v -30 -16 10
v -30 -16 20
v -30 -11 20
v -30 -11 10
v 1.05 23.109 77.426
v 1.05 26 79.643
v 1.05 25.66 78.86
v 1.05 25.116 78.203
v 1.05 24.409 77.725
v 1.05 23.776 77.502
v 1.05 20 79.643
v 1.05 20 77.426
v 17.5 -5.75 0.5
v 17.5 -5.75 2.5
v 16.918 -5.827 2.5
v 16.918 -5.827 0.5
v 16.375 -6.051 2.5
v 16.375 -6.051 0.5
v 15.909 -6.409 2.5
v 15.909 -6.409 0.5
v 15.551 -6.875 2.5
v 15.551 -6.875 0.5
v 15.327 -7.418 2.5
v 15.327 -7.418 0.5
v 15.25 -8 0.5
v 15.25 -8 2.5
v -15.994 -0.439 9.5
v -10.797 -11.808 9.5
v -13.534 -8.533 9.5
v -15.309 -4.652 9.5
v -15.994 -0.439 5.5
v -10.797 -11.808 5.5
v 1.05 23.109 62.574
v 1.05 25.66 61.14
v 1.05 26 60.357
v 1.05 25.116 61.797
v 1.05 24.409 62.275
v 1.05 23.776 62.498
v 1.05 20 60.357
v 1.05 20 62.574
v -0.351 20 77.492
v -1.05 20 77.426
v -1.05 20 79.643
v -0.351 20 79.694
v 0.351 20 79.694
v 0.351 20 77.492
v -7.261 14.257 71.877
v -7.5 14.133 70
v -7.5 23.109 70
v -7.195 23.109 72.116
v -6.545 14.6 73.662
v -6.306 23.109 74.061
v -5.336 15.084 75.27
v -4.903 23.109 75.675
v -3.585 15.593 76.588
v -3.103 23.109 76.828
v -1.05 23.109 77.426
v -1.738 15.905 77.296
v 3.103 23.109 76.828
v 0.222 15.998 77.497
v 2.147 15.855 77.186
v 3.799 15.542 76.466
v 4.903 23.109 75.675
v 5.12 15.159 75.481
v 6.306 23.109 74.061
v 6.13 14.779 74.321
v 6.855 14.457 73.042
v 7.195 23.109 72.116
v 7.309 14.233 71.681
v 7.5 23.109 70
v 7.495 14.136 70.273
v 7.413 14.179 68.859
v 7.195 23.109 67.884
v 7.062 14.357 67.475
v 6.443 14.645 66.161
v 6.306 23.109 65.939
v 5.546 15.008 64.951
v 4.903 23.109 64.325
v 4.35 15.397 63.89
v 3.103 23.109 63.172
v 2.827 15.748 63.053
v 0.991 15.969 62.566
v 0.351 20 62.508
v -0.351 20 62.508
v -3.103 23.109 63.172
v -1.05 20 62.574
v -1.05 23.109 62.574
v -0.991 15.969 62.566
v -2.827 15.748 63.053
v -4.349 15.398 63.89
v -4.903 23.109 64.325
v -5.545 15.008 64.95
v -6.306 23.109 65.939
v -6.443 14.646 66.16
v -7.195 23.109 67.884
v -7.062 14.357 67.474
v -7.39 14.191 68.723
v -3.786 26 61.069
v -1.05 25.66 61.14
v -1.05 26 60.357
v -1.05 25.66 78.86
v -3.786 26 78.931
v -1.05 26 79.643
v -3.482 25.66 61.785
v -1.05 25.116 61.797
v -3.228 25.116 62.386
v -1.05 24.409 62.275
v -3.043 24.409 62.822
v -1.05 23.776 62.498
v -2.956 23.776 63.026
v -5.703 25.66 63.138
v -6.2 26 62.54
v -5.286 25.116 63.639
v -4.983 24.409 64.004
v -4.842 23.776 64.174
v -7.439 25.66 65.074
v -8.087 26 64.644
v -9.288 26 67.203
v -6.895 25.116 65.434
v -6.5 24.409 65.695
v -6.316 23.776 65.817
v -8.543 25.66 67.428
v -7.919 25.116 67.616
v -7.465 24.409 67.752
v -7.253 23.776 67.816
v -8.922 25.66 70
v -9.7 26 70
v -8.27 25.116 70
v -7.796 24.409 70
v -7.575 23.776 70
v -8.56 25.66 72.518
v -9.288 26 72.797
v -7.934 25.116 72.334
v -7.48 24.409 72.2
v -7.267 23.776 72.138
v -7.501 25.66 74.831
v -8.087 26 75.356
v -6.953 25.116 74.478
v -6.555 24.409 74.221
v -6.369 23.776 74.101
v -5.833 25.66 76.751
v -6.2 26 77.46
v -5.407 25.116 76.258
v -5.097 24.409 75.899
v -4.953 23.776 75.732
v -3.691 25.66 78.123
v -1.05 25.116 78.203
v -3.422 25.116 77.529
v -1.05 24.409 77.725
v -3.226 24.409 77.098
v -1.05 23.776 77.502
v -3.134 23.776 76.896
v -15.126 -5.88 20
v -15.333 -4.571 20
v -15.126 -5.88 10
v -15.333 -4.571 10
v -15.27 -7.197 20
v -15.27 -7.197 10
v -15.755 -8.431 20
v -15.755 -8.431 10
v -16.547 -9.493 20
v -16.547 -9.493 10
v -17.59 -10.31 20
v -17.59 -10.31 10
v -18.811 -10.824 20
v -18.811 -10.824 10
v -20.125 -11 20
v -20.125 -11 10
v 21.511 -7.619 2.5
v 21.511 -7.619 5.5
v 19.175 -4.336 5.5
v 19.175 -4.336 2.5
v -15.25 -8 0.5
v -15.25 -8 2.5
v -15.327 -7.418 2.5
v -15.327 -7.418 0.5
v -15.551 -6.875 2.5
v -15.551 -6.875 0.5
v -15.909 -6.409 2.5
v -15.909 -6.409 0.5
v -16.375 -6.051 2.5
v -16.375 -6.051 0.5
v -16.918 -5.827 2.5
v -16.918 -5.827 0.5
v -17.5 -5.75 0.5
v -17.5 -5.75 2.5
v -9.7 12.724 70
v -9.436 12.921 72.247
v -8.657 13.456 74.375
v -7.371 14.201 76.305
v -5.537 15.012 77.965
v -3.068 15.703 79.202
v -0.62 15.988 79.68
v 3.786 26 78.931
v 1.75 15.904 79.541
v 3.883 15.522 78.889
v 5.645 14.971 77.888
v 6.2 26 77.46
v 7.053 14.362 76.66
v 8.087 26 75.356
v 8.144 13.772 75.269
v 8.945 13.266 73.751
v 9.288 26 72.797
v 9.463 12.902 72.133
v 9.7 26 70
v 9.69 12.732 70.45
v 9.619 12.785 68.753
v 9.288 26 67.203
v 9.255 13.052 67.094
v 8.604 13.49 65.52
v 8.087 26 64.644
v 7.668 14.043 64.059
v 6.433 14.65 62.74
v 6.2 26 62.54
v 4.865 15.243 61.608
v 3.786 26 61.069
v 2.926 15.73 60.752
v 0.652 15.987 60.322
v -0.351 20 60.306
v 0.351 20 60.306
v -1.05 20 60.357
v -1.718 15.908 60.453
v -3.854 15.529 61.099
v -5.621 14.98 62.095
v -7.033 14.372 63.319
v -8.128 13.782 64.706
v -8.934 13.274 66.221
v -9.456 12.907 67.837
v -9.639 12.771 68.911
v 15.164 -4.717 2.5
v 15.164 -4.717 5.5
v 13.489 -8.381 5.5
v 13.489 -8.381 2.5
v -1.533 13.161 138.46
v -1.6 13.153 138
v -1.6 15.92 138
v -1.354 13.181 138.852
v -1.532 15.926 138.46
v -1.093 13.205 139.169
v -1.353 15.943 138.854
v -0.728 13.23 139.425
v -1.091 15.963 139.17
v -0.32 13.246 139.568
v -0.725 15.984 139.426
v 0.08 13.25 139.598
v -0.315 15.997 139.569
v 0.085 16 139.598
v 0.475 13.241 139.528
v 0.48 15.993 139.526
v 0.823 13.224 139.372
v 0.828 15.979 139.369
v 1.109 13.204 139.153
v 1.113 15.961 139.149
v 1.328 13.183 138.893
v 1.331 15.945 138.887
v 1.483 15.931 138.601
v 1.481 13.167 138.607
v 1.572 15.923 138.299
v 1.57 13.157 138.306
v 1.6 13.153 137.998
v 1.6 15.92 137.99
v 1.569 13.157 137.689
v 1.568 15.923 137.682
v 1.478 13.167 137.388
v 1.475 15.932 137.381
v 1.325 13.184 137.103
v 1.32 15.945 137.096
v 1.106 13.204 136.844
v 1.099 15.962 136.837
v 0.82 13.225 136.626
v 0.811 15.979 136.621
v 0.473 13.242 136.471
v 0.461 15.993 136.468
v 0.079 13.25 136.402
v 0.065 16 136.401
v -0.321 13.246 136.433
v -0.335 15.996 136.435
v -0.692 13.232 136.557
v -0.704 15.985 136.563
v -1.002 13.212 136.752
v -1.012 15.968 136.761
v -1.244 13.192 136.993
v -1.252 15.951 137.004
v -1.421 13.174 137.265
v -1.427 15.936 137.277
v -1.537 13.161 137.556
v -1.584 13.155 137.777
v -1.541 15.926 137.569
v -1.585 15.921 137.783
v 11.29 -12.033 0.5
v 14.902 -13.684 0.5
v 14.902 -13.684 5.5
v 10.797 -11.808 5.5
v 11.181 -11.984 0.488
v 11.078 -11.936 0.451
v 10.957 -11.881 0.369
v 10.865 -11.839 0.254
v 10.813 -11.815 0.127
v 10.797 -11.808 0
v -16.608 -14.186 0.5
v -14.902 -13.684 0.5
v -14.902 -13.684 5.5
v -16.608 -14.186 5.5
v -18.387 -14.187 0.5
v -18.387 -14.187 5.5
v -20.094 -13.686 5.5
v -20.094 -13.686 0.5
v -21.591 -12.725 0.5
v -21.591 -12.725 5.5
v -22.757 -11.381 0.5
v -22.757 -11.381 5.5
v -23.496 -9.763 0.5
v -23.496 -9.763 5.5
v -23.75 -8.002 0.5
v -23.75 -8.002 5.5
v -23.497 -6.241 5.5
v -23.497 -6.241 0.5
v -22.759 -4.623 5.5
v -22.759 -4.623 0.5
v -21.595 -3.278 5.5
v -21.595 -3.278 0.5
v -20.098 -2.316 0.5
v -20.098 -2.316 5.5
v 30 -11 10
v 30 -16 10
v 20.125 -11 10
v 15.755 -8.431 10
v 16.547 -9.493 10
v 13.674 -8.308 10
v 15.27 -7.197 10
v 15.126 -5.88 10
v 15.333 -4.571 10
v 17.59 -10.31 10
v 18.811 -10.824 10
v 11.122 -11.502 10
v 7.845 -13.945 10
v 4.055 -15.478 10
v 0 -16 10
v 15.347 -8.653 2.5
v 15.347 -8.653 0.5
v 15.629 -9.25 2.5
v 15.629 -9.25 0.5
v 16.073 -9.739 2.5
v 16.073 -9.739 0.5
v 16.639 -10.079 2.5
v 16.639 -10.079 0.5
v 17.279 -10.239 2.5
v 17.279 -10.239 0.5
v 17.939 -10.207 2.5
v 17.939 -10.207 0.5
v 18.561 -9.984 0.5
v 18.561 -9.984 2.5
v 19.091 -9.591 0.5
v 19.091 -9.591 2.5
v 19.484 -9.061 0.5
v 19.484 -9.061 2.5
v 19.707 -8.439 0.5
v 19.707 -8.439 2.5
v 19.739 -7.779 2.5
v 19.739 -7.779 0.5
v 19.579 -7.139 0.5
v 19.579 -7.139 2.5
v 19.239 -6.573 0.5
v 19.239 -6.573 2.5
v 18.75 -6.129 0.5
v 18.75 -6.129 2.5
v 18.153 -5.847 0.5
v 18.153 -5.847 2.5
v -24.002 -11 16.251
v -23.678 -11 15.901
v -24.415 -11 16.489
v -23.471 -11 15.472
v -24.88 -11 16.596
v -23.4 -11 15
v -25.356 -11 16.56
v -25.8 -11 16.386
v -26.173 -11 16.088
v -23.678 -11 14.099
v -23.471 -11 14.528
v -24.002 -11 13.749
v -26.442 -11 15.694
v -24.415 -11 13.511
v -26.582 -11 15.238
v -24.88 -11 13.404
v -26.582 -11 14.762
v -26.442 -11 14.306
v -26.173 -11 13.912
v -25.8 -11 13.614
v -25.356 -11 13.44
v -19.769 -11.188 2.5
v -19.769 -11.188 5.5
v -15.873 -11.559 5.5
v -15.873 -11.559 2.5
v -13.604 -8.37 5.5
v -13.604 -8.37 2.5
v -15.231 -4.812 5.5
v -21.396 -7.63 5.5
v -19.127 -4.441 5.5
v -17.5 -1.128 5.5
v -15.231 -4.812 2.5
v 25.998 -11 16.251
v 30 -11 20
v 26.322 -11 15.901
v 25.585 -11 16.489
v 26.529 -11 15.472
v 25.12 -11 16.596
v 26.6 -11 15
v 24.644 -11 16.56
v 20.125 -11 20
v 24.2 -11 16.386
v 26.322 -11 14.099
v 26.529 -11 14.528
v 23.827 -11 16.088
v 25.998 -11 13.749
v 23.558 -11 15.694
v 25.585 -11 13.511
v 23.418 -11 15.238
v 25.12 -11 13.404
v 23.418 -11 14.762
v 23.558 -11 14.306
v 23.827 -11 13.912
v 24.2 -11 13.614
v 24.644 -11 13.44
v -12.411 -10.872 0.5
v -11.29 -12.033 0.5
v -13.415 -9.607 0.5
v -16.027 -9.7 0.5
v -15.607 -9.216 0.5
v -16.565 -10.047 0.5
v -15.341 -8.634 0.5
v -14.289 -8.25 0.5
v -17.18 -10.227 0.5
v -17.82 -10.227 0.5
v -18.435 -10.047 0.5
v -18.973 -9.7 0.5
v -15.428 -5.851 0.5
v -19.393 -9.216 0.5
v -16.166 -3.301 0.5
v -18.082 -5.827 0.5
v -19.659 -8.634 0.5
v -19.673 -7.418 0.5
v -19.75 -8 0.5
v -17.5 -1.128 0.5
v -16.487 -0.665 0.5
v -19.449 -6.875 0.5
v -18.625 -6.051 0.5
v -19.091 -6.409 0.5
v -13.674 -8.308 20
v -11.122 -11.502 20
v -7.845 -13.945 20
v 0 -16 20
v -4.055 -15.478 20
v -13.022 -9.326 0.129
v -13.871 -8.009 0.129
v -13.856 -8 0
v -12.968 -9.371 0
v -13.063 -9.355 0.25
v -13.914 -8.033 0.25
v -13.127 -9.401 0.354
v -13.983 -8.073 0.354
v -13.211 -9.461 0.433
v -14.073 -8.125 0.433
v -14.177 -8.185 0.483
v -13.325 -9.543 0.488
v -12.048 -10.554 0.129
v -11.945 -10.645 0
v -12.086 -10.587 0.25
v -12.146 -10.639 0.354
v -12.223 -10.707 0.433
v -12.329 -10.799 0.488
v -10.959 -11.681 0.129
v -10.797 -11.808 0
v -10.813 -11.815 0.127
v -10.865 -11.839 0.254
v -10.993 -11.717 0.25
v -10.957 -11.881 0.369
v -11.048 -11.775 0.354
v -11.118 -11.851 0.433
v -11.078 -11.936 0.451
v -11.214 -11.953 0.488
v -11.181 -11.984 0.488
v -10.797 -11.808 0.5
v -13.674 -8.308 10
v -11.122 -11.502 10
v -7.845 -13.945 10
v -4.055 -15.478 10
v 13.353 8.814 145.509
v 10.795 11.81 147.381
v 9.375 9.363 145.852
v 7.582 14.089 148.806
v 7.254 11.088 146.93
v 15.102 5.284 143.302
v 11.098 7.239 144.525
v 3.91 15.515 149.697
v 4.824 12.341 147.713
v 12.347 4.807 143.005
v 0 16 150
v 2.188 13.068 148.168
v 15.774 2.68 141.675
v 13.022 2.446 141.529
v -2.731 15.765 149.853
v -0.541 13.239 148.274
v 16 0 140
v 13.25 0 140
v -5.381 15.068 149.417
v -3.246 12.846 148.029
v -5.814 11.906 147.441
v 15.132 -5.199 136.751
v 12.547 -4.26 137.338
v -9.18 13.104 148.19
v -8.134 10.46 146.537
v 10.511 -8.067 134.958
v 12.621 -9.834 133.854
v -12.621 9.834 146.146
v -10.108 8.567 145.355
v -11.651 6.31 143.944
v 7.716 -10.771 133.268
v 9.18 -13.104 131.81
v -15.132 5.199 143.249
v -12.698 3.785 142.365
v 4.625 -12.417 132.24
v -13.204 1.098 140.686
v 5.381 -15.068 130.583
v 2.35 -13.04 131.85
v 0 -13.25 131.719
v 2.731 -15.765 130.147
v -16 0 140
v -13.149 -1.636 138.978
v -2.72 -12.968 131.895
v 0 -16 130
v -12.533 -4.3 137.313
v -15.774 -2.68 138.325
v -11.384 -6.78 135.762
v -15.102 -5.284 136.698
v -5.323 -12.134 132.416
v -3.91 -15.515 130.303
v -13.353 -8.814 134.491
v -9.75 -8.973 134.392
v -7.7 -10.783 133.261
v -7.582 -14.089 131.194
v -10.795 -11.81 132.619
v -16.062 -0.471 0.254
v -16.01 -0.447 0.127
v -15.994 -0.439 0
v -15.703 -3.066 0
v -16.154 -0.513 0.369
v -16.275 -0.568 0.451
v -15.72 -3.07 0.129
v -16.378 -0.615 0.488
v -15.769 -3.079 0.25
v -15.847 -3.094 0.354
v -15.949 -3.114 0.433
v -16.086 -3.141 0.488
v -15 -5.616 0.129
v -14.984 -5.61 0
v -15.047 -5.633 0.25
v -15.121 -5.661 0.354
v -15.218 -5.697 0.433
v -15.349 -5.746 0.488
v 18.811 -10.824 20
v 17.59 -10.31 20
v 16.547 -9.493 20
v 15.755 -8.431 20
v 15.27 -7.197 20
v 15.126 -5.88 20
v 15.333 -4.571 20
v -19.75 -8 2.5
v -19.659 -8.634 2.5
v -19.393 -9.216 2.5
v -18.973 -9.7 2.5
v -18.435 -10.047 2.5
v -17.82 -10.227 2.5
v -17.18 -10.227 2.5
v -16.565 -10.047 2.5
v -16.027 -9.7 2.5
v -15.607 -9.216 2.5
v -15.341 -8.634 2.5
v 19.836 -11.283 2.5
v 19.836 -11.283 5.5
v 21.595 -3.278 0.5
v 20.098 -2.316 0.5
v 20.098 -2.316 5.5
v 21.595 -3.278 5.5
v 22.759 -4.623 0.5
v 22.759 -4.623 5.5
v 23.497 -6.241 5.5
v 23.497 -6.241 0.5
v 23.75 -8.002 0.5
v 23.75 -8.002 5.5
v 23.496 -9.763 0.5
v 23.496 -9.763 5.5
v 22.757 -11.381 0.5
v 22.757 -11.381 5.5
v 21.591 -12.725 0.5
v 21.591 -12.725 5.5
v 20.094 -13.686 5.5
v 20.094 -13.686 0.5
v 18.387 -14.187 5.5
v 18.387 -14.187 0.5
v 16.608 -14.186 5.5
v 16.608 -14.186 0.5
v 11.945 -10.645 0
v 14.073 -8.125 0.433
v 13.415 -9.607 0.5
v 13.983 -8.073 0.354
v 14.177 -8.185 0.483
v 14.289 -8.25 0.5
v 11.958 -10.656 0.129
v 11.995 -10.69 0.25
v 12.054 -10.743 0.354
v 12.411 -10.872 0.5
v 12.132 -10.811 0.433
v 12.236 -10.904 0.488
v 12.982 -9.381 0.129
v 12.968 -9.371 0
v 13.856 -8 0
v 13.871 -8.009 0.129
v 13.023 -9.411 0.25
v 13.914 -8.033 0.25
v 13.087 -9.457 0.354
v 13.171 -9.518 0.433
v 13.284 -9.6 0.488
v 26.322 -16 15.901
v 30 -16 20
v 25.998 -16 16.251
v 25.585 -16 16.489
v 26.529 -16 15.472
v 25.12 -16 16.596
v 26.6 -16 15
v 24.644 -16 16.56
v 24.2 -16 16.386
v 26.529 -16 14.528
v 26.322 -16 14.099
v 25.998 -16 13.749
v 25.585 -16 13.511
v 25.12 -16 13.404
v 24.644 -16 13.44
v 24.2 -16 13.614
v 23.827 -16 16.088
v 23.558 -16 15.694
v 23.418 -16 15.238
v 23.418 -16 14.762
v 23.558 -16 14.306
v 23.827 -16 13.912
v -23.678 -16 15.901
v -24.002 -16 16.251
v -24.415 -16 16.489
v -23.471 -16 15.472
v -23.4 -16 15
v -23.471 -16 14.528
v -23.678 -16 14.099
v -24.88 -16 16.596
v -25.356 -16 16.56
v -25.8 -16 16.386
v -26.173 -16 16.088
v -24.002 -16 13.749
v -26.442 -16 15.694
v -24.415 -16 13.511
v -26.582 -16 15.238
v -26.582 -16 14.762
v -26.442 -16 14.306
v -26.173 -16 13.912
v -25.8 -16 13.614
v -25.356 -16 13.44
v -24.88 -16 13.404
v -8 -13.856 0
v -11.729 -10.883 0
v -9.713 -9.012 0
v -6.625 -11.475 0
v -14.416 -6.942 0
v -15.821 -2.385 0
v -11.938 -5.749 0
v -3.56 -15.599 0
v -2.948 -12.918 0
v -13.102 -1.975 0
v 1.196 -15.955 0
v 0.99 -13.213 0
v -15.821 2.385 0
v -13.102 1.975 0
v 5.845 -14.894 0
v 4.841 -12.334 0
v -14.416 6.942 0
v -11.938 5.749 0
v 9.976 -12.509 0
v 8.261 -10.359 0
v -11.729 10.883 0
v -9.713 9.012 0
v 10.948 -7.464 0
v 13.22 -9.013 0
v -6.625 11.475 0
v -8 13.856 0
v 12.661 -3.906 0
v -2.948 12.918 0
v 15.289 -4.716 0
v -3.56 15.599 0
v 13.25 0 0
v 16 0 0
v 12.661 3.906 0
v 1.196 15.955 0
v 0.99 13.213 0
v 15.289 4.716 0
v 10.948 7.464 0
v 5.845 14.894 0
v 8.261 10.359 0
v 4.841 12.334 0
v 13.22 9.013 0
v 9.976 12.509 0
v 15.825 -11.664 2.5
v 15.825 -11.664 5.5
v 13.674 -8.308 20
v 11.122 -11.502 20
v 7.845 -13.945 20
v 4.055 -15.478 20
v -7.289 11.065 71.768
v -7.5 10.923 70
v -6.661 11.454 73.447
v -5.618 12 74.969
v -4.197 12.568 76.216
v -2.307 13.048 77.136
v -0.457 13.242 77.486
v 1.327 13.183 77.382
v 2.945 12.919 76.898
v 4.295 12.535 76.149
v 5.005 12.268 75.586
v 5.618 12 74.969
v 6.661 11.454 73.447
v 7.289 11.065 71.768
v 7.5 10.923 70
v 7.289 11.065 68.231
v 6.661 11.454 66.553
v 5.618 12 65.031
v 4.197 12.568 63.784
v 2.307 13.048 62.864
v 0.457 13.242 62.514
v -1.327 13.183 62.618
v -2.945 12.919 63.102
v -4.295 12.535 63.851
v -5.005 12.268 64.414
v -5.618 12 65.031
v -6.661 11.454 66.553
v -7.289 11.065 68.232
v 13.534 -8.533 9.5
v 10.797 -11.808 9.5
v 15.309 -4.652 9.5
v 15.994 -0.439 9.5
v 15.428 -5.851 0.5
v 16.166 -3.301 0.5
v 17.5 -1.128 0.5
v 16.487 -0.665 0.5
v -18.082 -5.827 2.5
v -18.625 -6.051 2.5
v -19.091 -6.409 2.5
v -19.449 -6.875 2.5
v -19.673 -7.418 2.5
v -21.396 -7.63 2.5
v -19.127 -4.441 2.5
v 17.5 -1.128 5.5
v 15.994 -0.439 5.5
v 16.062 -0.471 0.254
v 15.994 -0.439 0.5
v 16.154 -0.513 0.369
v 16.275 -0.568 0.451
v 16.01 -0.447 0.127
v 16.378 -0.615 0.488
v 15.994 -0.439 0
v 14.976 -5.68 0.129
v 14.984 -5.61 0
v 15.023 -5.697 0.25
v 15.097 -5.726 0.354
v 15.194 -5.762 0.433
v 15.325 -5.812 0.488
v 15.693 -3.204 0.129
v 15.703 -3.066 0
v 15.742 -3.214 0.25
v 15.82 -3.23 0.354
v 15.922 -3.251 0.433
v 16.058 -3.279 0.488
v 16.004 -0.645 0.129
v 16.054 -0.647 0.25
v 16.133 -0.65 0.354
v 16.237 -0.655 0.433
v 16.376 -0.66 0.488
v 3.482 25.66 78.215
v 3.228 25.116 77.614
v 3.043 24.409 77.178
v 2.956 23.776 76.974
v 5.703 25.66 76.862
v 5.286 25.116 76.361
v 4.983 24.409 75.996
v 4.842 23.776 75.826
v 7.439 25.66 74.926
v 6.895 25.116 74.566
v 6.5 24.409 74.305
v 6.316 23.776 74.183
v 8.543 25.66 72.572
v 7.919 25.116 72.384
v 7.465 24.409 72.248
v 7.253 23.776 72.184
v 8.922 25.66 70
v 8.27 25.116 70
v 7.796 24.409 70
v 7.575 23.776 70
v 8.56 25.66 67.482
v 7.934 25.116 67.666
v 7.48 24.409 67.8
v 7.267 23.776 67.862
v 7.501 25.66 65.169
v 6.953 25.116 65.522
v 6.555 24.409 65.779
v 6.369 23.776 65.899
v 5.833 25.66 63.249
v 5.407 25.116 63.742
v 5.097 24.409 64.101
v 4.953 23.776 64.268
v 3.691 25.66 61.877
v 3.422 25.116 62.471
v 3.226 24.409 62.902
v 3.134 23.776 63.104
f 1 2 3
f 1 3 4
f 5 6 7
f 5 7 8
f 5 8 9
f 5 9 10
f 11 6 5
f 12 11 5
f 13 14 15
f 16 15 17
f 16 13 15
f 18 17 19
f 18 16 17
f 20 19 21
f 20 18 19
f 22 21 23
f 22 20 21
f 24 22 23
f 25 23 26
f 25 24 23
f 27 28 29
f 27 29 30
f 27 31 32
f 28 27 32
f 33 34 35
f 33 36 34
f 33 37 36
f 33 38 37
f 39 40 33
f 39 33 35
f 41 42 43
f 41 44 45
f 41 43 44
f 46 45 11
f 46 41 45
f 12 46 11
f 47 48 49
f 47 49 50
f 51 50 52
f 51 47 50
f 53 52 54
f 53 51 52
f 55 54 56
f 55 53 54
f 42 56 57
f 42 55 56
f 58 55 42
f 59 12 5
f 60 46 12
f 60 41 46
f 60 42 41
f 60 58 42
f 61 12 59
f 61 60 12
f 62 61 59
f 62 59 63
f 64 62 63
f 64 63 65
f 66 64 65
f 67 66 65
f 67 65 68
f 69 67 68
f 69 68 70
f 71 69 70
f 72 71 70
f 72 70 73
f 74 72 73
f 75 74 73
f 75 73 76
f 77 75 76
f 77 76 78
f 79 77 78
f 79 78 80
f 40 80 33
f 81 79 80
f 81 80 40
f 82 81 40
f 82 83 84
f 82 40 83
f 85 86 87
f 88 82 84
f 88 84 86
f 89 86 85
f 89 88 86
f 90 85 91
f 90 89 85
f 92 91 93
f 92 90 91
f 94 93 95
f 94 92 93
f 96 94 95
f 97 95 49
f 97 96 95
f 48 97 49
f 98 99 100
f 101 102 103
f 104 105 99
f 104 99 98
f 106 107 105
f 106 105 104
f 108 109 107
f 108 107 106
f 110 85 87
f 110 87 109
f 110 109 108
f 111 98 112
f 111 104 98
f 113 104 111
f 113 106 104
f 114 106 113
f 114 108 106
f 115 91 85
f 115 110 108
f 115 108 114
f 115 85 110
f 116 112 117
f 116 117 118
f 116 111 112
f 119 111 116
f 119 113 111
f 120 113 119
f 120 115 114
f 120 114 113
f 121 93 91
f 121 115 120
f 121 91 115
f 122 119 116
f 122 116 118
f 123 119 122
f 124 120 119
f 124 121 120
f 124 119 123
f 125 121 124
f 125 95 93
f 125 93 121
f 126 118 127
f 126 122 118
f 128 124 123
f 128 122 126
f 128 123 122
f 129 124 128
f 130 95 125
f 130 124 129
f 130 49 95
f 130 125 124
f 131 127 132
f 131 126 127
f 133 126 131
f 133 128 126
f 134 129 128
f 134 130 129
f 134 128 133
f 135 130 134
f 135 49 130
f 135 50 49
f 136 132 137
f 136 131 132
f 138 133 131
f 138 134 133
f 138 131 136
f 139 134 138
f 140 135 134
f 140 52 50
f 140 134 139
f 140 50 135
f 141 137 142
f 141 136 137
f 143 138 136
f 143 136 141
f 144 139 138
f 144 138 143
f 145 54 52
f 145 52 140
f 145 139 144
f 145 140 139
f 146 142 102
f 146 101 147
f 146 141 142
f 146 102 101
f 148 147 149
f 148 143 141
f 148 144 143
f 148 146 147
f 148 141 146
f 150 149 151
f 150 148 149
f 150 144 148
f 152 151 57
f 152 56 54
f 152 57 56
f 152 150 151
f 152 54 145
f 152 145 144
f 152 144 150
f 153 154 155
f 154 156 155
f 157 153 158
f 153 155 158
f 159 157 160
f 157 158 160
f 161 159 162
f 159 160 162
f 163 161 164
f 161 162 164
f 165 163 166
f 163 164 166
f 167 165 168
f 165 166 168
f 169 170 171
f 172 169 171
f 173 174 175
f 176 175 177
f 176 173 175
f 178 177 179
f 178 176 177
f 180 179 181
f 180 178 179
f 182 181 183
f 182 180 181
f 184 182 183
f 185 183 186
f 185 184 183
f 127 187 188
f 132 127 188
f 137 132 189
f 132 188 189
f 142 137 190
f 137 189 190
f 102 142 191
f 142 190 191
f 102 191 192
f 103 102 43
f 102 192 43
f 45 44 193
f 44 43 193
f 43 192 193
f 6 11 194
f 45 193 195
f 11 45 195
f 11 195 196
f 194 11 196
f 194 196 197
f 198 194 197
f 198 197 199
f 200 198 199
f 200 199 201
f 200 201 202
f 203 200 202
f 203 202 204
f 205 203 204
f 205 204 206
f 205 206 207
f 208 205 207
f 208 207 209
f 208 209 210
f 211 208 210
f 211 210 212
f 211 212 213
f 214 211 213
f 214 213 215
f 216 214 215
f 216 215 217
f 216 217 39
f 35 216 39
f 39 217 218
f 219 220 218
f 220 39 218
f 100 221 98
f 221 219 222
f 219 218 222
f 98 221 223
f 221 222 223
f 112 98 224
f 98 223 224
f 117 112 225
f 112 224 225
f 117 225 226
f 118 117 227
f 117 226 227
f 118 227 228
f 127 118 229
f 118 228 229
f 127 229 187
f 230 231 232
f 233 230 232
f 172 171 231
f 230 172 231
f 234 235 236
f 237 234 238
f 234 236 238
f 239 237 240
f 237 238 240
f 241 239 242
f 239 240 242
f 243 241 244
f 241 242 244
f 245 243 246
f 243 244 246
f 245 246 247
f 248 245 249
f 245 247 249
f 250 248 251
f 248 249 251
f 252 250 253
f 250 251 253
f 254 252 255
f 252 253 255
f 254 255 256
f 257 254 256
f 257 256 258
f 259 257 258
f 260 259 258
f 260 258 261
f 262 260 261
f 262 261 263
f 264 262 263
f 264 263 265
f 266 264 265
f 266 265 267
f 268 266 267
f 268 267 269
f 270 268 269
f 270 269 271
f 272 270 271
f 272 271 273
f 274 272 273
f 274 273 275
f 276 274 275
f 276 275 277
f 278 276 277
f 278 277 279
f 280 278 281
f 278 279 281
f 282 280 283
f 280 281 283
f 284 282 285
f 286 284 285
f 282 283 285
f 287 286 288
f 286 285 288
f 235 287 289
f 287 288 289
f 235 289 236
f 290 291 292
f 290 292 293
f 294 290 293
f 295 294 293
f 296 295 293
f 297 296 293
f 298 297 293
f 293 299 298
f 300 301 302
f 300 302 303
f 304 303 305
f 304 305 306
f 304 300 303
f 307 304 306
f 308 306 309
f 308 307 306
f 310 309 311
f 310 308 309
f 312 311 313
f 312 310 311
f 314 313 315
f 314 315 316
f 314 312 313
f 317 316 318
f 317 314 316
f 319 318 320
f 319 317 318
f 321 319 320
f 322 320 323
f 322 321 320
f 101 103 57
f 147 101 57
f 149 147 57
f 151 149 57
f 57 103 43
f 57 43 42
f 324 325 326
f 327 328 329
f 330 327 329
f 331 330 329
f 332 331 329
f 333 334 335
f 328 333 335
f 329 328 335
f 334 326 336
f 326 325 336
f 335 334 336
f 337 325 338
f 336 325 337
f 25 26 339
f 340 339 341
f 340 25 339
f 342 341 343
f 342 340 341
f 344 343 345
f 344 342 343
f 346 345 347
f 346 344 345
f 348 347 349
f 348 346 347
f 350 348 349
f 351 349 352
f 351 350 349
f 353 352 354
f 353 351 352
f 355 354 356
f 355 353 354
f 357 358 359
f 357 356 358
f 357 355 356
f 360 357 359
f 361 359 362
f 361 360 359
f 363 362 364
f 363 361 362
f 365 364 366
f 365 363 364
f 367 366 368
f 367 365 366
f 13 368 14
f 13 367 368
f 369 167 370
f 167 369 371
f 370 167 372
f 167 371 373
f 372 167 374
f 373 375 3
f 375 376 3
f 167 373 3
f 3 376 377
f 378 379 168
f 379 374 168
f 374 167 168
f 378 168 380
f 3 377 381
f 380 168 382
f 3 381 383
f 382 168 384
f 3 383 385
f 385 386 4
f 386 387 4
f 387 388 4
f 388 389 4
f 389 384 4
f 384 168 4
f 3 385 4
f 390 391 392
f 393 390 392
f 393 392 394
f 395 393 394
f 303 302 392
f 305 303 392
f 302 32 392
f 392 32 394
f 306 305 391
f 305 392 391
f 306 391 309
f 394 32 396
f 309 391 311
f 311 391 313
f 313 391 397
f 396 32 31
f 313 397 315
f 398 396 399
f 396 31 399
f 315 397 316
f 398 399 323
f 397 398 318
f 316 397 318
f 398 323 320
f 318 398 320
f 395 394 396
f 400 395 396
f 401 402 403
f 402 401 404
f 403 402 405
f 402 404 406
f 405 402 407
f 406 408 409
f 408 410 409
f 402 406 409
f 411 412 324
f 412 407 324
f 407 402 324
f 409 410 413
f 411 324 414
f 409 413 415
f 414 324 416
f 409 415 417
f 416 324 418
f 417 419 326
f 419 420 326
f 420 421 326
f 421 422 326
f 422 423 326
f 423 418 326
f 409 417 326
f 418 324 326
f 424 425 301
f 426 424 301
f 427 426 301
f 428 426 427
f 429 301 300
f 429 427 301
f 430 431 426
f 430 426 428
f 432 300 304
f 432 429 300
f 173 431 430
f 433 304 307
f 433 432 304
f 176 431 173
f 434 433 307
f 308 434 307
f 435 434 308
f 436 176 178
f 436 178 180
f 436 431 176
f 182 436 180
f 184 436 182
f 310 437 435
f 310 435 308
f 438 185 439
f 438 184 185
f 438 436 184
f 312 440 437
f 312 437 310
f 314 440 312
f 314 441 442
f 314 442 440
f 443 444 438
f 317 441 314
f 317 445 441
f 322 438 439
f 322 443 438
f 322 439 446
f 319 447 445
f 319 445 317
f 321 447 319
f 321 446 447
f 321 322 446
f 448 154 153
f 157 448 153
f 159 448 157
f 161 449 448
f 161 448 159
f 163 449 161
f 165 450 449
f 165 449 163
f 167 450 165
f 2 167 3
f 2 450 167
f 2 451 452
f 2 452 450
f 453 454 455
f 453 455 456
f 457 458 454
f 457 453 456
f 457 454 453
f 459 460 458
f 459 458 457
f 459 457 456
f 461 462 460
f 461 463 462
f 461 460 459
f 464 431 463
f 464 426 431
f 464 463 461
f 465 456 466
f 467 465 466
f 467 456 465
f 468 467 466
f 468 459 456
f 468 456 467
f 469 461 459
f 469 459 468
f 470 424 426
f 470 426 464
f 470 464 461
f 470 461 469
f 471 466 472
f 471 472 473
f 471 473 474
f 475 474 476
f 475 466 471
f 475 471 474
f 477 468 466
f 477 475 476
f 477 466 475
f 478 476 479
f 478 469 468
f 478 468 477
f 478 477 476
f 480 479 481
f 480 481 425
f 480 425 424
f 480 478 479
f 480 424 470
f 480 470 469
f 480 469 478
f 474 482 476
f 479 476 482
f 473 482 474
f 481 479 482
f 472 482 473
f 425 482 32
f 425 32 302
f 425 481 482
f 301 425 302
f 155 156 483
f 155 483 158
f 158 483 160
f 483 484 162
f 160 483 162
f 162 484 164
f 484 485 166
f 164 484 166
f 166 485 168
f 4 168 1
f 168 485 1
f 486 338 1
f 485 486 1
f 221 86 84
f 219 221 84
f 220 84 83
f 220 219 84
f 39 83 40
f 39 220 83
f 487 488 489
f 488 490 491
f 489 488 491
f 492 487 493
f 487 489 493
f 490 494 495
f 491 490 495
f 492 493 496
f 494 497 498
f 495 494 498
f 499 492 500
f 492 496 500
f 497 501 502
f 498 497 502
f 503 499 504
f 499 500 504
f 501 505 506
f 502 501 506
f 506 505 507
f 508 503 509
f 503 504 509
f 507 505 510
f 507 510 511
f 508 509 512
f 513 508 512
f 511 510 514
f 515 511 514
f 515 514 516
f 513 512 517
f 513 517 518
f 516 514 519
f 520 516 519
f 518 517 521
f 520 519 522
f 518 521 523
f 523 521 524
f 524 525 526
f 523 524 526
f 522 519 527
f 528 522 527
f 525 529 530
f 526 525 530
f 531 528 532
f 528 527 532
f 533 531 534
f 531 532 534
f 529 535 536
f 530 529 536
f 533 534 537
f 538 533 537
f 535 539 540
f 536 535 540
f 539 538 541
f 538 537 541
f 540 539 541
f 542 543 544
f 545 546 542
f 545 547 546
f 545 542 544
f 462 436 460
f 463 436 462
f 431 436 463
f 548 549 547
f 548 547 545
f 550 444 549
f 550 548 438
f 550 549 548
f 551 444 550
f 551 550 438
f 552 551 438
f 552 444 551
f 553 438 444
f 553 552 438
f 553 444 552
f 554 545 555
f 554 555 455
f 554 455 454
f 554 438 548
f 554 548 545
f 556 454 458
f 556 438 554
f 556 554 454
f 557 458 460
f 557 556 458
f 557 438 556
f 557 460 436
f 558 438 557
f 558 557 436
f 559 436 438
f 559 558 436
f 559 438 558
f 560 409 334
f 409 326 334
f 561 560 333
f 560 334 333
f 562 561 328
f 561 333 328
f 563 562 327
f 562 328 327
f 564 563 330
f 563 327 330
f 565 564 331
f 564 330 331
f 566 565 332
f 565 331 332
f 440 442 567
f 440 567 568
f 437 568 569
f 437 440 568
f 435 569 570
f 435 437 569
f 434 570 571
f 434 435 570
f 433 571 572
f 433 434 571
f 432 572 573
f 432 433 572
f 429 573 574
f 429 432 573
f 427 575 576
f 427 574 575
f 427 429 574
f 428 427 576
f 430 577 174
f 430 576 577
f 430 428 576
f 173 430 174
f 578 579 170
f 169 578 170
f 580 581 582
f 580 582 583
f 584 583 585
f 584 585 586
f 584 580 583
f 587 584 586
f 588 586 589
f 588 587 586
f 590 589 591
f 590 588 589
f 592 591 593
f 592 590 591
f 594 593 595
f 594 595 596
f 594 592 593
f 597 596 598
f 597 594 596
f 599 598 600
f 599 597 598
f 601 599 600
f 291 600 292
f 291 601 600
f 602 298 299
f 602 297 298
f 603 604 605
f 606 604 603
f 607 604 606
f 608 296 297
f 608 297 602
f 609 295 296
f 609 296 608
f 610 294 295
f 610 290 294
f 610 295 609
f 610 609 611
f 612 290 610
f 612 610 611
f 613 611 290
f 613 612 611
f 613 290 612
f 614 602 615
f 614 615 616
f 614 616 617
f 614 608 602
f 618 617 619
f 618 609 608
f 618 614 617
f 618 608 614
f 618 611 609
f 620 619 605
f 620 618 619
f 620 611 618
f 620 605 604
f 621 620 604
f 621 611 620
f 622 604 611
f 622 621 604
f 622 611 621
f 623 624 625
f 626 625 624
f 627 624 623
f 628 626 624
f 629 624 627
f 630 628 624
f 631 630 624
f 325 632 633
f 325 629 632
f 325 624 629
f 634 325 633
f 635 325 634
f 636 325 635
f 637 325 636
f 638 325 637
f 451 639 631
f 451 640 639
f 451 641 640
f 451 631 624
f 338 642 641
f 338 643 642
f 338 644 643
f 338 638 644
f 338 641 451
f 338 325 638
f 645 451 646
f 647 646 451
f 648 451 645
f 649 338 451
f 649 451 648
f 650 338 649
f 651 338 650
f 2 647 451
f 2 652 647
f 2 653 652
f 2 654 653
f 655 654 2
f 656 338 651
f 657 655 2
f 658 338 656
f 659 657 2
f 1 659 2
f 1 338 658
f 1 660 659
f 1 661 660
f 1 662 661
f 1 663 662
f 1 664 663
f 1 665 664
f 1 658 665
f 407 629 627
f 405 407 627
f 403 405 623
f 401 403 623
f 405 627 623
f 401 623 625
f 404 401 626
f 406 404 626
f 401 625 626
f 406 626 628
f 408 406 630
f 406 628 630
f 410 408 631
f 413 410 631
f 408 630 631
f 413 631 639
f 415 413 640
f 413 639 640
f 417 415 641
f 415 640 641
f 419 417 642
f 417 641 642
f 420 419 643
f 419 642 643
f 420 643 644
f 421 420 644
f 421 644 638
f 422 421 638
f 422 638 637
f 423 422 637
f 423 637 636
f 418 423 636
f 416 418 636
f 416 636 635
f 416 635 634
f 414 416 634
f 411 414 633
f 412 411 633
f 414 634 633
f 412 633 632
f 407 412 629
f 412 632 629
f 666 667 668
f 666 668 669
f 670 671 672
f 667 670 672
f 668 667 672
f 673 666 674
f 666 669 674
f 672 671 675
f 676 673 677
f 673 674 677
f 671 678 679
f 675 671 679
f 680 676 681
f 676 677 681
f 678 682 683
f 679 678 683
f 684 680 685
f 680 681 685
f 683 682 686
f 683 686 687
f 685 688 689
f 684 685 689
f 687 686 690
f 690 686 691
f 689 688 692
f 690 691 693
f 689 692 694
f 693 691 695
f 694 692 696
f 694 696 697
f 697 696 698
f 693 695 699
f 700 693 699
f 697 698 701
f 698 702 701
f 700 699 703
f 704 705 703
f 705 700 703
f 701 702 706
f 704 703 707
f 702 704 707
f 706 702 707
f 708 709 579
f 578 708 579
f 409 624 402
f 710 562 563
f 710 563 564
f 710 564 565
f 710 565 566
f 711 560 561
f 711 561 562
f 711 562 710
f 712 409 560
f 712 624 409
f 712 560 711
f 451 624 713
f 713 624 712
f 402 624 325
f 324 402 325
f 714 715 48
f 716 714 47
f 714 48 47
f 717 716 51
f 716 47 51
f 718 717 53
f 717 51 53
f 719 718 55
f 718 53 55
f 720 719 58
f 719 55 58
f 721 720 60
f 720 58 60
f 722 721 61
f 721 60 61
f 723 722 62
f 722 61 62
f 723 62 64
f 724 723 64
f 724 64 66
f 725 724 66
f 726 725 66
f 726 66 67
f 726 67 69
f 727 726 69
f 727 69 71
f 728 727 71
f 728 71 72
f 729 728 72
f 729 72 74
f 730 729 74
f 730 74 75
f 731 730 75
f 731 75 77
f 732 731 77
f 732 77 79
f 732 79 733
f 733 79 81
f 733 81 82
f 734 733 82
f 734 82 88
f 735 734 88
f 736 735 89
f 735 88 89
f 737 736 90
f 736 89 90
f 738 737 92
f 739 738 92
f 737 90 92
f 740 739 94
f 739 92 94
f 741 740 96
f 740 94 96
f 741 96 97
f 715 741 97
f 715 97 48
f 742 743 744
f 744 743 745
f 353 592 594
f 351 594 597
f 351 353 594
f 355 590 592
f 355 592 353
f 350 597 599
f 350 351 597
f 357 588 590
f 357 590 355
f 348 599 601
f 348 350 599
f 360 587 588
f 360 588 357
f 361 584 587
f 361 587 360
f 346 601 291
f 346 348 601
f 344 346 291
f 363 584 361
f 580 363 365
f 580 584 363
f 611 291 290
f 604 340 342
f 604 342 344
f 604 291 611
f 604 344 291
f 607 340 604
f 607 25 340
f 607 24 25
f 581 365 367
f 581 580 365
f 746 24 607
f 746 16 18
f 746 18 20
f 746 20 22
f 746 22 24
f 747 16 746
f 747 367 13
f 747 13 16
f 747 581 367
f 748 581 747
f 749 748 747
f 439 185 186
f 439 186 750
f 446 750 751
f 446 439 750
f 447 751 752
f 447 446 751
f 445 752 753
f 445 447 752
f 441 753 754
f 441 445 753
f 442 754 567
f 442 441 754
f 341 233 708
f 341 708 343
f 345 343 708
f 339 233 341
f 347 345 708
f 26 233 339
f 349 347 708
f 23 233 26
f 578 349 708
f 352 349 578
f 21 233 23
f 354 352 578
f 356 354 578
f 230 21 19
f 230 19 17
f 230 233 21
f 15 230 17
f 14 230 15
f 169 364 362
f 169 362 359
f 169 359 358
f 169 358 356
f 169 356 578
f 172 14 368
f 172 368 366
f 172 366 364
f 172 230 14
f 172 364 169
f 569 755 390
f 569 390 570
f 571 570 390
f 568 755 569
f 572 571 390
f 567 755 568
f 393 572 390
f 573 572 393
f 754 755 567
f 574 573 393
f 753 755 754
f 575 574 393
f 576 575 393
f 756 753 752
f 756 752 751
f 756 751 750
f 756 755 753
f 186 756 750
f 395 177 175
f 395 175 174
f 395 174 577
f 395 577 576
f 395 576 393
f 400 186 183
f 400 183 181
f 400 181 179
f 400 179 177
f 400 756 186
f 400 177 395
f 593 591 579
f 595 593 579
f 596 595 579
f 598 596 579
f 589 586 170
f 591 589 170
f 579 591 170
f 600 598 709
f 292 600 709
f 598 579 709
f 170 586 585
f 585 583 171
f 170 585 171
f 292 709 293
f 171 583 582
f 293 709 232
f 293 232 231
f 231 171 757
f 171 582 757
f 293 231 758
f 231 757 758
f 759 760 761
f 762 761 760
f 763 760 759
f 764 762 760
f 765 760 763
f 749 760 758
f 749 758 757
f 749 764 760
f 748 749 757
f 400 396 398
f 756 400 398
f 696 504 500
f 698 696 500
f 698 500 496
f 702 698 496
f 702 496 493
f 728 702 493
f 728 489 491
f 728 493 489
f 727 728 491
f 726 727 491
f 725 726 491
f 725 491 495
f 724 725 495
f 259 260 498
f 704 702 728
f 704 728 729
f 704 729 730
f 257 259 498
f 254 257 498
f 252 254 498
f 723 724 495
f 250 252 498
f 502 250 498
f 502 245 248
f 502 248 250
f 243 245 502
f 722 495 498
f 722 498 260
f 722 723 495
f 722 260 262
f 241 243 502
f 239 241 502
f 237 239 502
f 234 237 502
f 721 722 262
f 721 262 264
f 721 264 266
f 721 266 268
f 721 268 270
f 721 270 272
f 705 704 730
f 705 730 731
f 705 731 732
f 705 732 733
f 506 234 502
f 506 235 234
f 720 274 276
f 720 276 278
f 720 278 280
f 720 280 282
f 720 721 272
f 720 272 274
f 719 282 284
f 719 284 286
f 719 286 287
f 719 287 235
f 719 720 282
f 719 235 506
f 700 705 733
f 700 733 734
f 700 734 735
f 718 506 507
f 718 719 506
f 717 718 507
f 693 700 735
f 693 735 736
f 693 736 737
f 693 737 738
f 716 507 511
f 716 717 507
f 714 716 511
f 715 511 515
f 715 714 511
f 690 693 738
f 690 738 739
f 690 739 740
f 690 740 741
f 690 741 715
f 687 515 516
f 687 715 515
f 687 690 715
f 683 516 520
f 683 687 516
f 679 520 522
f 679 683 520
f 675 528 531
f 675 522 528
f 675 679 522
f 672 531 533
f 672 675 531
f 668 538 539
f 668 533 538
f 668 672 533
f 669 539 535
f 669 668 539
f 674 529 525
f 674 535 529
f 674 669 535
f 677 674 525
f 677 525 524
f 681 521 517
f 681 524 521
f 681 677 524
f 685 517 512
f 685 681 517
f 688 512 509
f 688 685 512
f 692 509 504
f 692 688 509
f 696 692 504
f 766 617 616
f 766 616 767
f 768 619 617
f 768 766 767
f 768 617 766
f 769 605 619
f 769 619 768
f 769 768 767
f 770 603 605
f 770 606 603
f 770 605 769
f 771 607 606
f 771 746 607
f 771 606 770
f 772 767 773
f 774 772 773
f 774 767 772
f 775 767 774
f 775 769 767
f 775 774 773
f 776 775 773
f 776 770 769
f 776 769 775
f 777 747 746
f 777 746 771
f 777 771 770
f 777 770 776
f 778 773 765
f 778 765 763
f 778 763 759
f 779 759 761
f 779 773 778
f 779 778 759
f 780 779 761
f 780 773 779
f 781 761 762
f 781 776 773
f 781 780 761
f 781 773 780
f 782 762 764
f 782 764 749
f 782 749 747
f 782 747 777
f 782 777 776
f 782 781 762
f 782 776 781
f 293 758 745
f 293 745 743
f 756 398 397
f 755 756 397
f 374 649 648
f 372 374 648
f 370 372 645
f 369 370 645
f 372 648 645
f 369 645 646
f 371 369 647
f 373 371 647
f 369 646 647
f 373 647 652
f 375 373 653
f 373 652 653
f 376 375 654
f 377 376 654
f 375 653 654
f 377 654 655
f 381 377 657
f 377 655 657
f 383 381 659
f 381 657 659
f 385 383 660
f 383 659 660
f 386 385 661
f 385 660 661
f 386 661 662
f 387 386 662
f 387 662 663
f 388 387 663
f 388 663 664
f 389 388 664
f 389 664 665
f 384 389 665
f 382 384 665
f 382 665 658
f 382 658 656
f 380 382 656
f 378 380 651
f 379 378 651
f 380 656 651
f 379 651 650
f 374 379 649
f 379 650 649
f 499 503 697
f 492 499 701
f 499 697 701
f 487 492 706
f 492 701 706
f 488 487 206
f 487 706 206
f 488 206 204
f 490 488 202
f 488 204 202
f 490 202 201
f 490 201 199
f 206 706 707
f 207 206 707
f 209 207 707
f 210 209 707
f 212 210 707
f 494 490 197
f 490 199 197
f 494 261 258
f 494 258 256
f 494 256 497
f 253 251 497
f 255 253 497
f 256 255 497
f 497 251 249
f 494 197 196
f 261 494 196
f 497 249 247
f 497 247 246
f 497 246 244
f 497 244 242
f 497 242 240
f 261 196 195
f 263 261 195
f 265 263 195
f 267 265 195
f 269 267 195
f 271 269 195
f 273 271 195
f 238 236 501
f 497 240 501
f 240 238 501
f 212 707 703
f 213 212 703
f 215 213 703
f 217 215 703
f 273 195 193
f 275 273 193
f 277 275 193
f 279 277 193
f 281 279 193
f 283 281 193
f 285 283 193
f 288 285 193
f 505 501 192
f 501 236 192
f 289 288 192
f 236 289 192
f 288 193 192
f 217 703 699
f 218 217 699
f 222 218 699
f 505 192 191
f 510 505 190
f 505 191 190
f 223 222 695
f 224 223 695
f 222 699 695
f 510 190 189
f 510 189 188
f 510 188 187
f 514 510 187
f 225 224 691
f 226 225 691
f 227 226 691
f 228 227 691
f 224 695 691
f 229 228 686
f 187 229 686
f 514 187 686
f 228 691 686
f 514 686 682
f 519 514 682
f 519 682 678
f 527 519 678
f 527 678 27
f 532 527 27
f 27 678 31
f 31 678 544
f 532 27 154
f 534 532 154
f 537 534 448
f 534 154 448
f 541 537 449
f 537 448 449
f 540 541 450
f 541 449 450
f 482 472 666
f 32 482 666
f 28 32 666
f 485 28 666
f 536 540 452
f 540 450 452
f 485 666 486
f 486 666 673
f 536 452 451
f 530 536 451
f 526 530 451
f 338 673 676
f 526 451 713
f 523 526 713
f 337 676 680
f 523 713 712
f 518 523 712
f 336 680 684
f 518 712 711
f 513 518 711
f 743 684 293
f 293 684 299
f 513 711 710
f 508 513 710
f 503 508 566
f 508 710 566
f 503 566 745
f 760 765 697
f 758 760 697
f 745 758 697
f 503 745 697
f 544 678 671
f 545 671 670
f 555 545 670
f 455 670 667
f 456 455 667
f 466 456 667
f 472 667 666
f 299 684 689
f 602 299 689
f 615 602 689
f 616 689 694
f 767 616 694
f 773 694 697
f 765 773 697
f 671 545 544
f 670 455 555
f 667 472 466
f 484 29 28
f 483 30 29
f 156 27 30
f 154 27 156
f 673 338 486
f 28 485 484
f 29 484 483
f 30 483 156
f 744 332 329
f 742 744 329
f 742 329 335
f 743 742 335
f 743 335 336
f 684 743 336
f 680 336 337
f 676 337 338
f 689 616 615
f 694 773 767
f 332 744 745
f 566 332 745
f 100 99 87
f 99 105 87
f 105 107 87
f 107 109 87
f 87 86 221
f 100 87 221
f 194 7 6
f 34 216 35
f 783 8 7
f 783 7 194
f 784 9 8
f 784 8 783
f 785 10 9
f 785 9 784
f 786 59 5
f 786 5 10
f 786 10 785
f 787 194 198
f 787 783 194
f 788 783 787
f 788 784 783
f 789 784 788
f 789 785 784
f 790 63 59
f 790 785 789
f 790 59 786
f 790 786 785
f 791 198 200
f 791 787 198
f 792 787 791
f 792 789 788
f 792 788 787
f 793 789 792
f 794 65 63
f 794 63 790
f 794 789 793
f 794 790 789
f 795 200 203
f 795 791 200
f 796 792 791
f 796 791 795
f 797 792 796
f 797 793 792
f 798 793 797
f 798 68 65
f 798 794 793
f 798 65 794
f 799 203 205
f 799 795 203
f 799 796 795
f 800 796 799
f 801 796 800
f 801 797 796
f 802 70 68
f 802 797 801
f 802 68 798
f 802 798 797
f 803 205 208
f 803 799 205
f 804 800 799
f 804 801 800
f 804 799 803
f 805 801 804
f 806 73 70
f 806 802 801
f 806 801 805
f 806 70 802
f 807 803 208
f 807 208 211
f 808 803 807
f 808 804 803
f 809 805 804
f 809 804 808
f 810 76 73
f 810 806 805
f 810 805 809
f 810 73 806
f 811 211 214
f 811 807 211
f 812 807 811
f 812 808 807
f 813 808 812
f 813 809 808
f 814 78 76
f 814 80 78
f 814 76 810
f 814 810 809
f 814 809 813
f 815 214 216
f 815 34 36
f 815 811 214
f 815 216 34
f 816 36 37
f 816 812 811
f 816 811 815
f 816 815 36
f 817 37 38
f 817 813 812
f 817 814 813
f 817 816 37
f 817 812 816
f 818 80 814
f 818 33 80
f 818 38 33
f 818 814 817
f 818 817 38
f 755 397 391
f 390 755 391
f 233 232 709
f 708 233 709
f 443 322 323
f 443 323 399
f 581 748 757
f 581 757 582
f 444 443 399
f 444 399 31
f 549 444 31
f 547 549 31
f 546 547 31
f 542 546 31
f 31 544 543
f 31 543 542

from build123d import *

# Parameters (mm, degrees)
SKETCH4_R                = 16
SKETCH4_R_2              = 13.25
BOSS_EXTRUDE3_DEPTH      = 150
BOSS_EXTRUDE4_DEPTH      = 10
BOSS_EXTRUDE4_DEPTH_BACK = 4
SKETCH6_R                = 9.7
SKETCH6_R_2              = 7.5
SKETCH7_R                = 7.5
CUT_EXTRUDE1_DEPTH       = 20
CUT_EXTRUDE2_START       = -150
SKETCH8_R                = 13.25
CUT_EXTRUDE2_DEPTH       = 150
SKETCH11_R               = 1.6
CUT_EXTRUDE5_DEPTH       = 13
CUT_EXTRUDE7_DEPTH       = 42.3
SKETCH15_W               = 60
SKETCH15_H               = 10
SKETCH15_R               = 1.6
BOSS_EXTRUDE5_DEPTH      = 5
SKETCH16_R               = 13.25
CUT_EXTRUDE8_DEPTH       = 150
FILLET2_R                = 3
FILLET3_R                = 5
CUT_EXTRUDE10_START      = 4
SKETCH20_R               = 4.747407389
SKETCH20_W               = 2.1
SKETCH20_H               = 3
CUT_EXTRUDE10_DEPTH      = 6
BOSS_EXTRUDE6_START      = -0.5
BOSS_EXTRUDE6_DEPTH      = 5
FILLET4_R                = 0.5
CUT_EXTRUDE11_DEPTH      = 4
CUT_EXTRUDE12_DEPTH      = 3


# Some blends are built 0.0001 mm under size
with BuildPart() as part:
    # Sketch4 → Boss-Extrude3 (new body)
    with BuildSketch(Plane.XY):
        Circle(SKETCH4_R)
        Circle(SKETCH4_R_2, mode=Mode.SUBTRACT)
    extrude(amount=BOSS_EXTRUDE3_DEPTH)

    # Sketch6 → Boss-Extrude4 (add, two sides: drawn at the far end of the back side and taken through both)
    with BuildSketch(Plane(origin=(0, 16, 150), x_dir=(1, 0, 0), z_dir=(0, 1, 0)).offset(-BOSS_EXTRUDE4_DEPTH_BACK)):
        with Locations(Location((0, 80, 0), (0, 0, 180))):
            Circle(SKETCH6_R)
        with Locations(Location((0, 80, 0), (0, 0, 180))):
            Circle(SKETCH6_R_2, mode=Mode.SUBTRACT)
    extrude(amount=BOSS_EXTRUDE4_DEPTH + BOSS_EXTRUDE4_DEPTH_BACK)

    # Sketch7 → Cut-Extrude1 (cut)
    with BuildSketch(Plane(origin=(0, 26, 0), x_dir=(1, 0, 0), z_dir=(0, 1, 0))):
        with Locations(Location((0, -70, 0), (0, 0, 180))):
            Circle(SKETCH7_R)
    extrude(amount=-CUT_EXTRUDE1_DEPTH, mode=Mode.SUBTRACT)

    # Sketch8 → Cut-Extrude2 (cut)
    with BuildSketch(Plane.XY.offset(150).offset(CUT_EXTRUDE2_START)):
        Circle(SKETCH8_R)
    extrude(amount=CUT_EXTRUDE2_DEPTH, mode=Mode.SUBTRACT)

    # Sketch11 → Cut-Extrude5 (cut)
    with BuildSketch(Plane(origin=(0, 16, 150), x_dir=(1, 0, 0), z_dir=(0, 1, 0))):
        with Locations(Location((0, 12, 0), (0, 0, 180))):
            Circle(SKETCH11_R)
    extrude(amount=-CUT_EXTRUDE5_DEPTH, mode=Mode.SUBTRACT)

    # Sketch14 → Cut-Extrude7 (cut)
    with BuildSketch(Plane.ZY.offset(16)):
        Polygon((150, 16), (130, -16), (150, -16), align=None)
    extrude(amount=-CUT_EXTRUDE7_DEPTH, mode=Mode.SUBTRACT)

    # Sketch15 → Boss-Extrude5 (add)
    with BuildSketch(Plane(origin=(0, -16, 150), x_dir=(-1, 0, 0), z_dir=(0, -1, 0))):
        with Locations((0, 135)):
            Rectangle(SKETCH15_W, SKETCH15_H)
        with Locations(Location((-25, 135, 0), (0, 0, 180))):
            Circle(SKETCH15_R, mode=Mode.SUBTRACT)
        with Locations(Location((25, 135, 0), (0, 0, 180))):
            Circle(SKETCH15_R, mode=Mode.SUBTRACT)
    extrude(amount=-BOSS_EXTRUDE5_DEPTH)

    # Sketch16 → Cut-Extrude8 (cut)
    with BuildSketch(Plane(origin=(0, 0, 0), x_dir=(-1, 0, 0), z_dir=(0, 0, -1))):
        with Locations(Location((0, 0, 0), (0, 0, 270))):
            Circle(SKETCH16_R)
    extrude(amount=-CUT_EXTRUDE8_DEPTH, mode=Mode.SUBTRACT)

    # Fillet2
    # the kernel refuses this fillet: 3 mm, written as the material it takes off along each edge
    with BuildSketch(Plane(origin=(0, 26, 70), x_dir=(-1, 0, 0), z_dir=(0, 0, -1))) as fillet2_piece_1:
        with BuildLine():
            CenterArc((10.5, -2.891366459), FILLET2_R, 105.466009953, 74.533990047)
            Line((7.5, -2.891366459), (7.44, -2.891366459))
            Line((7.44, -2.891366459), (7.44, 0))
            Line((7.44, 0), (7.5, 0.06))
            ThreePointArc((7.5, 0.06), (8.6, 0.06), (9.684, 0.057827329))
            Line((9.684, 0.057827329), (9.7, 0))
        make_face()
    revolve(axis=Axis((0, 26, 70), (0, 1, 0)), mode=Mode.SUBTRACT)

    # Fillet3
    fillet3_edges = [part.edges().sort_by_distance(p)[0] for p in [
        (11.618950039, -11, 15),
        (-11.618950039, -11, 15),
    ]]
    fillet(fillet3_edges, radius=FILLET3_R)

    # Sketch20 → Cut-Extrude10 (cut)
    with BuildSketch(Plane(origin=(0, 16, 150), x_dir=(1, 0, 0), z_dir=(0, 1, 0)).offset(CUT_EXTRUDE10_START)):
        with Locations((0, 80)):
            Circle(SKETCH20_R)
        with Locations((0, 88.2)):
            Rectangle(SKETCH20_W, SKETCH20_H)
        with Locations((0, 71.8)):
            Rectangle(SKETCH20_W, SKETCH20_H)
    extrude(amount=CUT_EXTRUDE10_DEPTH, mode=Mode.SUBTRACT)

    # Sketch21 → Boss-Extrude6 (add)
    with BuildSketch(Plane(origin=(0, 0, 0), x_dir=(-1, 0, 0), z_dir=(0, 0, -1)).offset(BOSS_EXTRUDE6_START)):
        with BuildLine():
            Line((-17.5, -5.75), (-17.5, -1.127899498))
            Line((-17.5, -1.127899498), (-20.098498502, -2.315784528))
            ThreePointArc((-20.098498502, -2.315784528), (-23.184215472, -10.598498502), (-14.901501498, -13.684215472))
            Line((-14.901501498, -13.684215472), (-10.796967628, -11.807857132))
            ThreePointArc((-10.796967628, -11.807857132), (-12.472856829, -10.021369294), (-13.856406461, -8))
            Line((-13.856406461, -8), (-15.25, -8))
            ThreePointArc((-15.25, -8), (-19.090990258, -9.590990258), (-17.5, -5.75))
        make_face()
        with BuildLine():
            ThreePointArc((-13.856406461, -8), (-15.396484426, -4.352960754), (-15.993964631, -0.439426187))
            Line((-15.993964631, -0.439426187), (-17.5, -1.127899498))
            Line((-17.5, -1.127899498), (-17.5, -5.75))
            ThreePointArc((-17.5, -5.75), (-15.909009742, -6.409009742), (-15.25, -8))
            Line((-15.25, -8), (-13.856406461, -8))
        make_face()
        with BuildLine():
            Line((20.098498502, -2.315784528), (17.5, -1.127899498))
            Line((17.5, -1.127899498), (17.5, -5.75))
            ThreePointArc((17.5, -5.75), (19.090990258, -6.409009742), (19.75, -8))
            ThreePointArc((19.75, -8), (17.5, -10.25), (15.25, -8))
            Line((15.25, -8), (13.856406461, -8))
            ThreePointArc((13.856406461, -8), (12.472856829, -10.021369294), (10.796967628, -11.807857132))
            Line((10.796967628, -11.807857132), (14.901501498, -13.684215472))
            ThreePointArc((14.901501498, -13.684215472), (23.184215472, -10.598498502), (20.098498502, -2.315784528))
        make_face()
        with BuildLine():
            Line((17.5, -5.75), (17.5, -1.127899498))
            Line((17.5, -1.127899498), (15.993964631, -0.439426187))
            ThreePointArc((15.993964631, -0.439426187), (15.396484426, -4.352960754), (13.856406461, -8))
            Line((13.856406461, -8), (15.25, -8))
            ThreePointArc((15.25, -8), (15.909009742, -6.409009742), (17.5, -5.75))
        make_face()
    extrude(amount=-BOSS_EXTRUDE6_DEPTH)

    # Fillet4
    fillet4_edges = [part.edges().sort_by_distance(p)[0] for p in [
        (14.551591609, -6.652156164, 0.5),
        (-14.551591609, -6.652156164, 0.5),
    ]]
    fillet(fillet4_edges, radius=FILLET4_R - 0.0001)  # a hair under: the kernel refuses the full size

    # Sketch22 → Cut-Extrude11 (cut)
    with BuildSketch(Plane.XY.offset(5.5)):
        Polygon((15.993964631, -0.439426187), (10.796967628, -11.807857132), (12.161179341, -12.431496772), (17.358176345, -1.063065827), align=None)
        Polygon((-15.993964631, -0.439426187), (-10.796967628, -11.807857132), (-12.161179341, -12.431496772), (-17.358176345, -1.063065827), align=None)
    extrude(amount=CUT_EXTRUDE11_DEPTH, mode=Mode.SUBTRACT)

    # Sketch23 → Cut-Extrude12 (cut)
    with BuildSketch(Plane.XY.offset(5.5)):
        Polygon((-19.126954006, -4.441038113), (-21.395628408, -7.629502556), (-19.768674403, -11.188464443), (-15.873045994, -11.558961887), (-13.604371592, -8.370497444), (-15.231325597, -4.811535557), align=None)
        Polygon((19.175049478, -4.335829267), (15.1642598, -4.717279233), (13.489210323, -8.381449966), (15.824950522, -11.664170733), (19.8357402, -11.282720767), (21.510789677, -7.618550034), align=None)
    extrude(amount=-CUT_EXTRUDE12_DEPTH, mode=Mode.SUBTRACT)


solid = part.part
